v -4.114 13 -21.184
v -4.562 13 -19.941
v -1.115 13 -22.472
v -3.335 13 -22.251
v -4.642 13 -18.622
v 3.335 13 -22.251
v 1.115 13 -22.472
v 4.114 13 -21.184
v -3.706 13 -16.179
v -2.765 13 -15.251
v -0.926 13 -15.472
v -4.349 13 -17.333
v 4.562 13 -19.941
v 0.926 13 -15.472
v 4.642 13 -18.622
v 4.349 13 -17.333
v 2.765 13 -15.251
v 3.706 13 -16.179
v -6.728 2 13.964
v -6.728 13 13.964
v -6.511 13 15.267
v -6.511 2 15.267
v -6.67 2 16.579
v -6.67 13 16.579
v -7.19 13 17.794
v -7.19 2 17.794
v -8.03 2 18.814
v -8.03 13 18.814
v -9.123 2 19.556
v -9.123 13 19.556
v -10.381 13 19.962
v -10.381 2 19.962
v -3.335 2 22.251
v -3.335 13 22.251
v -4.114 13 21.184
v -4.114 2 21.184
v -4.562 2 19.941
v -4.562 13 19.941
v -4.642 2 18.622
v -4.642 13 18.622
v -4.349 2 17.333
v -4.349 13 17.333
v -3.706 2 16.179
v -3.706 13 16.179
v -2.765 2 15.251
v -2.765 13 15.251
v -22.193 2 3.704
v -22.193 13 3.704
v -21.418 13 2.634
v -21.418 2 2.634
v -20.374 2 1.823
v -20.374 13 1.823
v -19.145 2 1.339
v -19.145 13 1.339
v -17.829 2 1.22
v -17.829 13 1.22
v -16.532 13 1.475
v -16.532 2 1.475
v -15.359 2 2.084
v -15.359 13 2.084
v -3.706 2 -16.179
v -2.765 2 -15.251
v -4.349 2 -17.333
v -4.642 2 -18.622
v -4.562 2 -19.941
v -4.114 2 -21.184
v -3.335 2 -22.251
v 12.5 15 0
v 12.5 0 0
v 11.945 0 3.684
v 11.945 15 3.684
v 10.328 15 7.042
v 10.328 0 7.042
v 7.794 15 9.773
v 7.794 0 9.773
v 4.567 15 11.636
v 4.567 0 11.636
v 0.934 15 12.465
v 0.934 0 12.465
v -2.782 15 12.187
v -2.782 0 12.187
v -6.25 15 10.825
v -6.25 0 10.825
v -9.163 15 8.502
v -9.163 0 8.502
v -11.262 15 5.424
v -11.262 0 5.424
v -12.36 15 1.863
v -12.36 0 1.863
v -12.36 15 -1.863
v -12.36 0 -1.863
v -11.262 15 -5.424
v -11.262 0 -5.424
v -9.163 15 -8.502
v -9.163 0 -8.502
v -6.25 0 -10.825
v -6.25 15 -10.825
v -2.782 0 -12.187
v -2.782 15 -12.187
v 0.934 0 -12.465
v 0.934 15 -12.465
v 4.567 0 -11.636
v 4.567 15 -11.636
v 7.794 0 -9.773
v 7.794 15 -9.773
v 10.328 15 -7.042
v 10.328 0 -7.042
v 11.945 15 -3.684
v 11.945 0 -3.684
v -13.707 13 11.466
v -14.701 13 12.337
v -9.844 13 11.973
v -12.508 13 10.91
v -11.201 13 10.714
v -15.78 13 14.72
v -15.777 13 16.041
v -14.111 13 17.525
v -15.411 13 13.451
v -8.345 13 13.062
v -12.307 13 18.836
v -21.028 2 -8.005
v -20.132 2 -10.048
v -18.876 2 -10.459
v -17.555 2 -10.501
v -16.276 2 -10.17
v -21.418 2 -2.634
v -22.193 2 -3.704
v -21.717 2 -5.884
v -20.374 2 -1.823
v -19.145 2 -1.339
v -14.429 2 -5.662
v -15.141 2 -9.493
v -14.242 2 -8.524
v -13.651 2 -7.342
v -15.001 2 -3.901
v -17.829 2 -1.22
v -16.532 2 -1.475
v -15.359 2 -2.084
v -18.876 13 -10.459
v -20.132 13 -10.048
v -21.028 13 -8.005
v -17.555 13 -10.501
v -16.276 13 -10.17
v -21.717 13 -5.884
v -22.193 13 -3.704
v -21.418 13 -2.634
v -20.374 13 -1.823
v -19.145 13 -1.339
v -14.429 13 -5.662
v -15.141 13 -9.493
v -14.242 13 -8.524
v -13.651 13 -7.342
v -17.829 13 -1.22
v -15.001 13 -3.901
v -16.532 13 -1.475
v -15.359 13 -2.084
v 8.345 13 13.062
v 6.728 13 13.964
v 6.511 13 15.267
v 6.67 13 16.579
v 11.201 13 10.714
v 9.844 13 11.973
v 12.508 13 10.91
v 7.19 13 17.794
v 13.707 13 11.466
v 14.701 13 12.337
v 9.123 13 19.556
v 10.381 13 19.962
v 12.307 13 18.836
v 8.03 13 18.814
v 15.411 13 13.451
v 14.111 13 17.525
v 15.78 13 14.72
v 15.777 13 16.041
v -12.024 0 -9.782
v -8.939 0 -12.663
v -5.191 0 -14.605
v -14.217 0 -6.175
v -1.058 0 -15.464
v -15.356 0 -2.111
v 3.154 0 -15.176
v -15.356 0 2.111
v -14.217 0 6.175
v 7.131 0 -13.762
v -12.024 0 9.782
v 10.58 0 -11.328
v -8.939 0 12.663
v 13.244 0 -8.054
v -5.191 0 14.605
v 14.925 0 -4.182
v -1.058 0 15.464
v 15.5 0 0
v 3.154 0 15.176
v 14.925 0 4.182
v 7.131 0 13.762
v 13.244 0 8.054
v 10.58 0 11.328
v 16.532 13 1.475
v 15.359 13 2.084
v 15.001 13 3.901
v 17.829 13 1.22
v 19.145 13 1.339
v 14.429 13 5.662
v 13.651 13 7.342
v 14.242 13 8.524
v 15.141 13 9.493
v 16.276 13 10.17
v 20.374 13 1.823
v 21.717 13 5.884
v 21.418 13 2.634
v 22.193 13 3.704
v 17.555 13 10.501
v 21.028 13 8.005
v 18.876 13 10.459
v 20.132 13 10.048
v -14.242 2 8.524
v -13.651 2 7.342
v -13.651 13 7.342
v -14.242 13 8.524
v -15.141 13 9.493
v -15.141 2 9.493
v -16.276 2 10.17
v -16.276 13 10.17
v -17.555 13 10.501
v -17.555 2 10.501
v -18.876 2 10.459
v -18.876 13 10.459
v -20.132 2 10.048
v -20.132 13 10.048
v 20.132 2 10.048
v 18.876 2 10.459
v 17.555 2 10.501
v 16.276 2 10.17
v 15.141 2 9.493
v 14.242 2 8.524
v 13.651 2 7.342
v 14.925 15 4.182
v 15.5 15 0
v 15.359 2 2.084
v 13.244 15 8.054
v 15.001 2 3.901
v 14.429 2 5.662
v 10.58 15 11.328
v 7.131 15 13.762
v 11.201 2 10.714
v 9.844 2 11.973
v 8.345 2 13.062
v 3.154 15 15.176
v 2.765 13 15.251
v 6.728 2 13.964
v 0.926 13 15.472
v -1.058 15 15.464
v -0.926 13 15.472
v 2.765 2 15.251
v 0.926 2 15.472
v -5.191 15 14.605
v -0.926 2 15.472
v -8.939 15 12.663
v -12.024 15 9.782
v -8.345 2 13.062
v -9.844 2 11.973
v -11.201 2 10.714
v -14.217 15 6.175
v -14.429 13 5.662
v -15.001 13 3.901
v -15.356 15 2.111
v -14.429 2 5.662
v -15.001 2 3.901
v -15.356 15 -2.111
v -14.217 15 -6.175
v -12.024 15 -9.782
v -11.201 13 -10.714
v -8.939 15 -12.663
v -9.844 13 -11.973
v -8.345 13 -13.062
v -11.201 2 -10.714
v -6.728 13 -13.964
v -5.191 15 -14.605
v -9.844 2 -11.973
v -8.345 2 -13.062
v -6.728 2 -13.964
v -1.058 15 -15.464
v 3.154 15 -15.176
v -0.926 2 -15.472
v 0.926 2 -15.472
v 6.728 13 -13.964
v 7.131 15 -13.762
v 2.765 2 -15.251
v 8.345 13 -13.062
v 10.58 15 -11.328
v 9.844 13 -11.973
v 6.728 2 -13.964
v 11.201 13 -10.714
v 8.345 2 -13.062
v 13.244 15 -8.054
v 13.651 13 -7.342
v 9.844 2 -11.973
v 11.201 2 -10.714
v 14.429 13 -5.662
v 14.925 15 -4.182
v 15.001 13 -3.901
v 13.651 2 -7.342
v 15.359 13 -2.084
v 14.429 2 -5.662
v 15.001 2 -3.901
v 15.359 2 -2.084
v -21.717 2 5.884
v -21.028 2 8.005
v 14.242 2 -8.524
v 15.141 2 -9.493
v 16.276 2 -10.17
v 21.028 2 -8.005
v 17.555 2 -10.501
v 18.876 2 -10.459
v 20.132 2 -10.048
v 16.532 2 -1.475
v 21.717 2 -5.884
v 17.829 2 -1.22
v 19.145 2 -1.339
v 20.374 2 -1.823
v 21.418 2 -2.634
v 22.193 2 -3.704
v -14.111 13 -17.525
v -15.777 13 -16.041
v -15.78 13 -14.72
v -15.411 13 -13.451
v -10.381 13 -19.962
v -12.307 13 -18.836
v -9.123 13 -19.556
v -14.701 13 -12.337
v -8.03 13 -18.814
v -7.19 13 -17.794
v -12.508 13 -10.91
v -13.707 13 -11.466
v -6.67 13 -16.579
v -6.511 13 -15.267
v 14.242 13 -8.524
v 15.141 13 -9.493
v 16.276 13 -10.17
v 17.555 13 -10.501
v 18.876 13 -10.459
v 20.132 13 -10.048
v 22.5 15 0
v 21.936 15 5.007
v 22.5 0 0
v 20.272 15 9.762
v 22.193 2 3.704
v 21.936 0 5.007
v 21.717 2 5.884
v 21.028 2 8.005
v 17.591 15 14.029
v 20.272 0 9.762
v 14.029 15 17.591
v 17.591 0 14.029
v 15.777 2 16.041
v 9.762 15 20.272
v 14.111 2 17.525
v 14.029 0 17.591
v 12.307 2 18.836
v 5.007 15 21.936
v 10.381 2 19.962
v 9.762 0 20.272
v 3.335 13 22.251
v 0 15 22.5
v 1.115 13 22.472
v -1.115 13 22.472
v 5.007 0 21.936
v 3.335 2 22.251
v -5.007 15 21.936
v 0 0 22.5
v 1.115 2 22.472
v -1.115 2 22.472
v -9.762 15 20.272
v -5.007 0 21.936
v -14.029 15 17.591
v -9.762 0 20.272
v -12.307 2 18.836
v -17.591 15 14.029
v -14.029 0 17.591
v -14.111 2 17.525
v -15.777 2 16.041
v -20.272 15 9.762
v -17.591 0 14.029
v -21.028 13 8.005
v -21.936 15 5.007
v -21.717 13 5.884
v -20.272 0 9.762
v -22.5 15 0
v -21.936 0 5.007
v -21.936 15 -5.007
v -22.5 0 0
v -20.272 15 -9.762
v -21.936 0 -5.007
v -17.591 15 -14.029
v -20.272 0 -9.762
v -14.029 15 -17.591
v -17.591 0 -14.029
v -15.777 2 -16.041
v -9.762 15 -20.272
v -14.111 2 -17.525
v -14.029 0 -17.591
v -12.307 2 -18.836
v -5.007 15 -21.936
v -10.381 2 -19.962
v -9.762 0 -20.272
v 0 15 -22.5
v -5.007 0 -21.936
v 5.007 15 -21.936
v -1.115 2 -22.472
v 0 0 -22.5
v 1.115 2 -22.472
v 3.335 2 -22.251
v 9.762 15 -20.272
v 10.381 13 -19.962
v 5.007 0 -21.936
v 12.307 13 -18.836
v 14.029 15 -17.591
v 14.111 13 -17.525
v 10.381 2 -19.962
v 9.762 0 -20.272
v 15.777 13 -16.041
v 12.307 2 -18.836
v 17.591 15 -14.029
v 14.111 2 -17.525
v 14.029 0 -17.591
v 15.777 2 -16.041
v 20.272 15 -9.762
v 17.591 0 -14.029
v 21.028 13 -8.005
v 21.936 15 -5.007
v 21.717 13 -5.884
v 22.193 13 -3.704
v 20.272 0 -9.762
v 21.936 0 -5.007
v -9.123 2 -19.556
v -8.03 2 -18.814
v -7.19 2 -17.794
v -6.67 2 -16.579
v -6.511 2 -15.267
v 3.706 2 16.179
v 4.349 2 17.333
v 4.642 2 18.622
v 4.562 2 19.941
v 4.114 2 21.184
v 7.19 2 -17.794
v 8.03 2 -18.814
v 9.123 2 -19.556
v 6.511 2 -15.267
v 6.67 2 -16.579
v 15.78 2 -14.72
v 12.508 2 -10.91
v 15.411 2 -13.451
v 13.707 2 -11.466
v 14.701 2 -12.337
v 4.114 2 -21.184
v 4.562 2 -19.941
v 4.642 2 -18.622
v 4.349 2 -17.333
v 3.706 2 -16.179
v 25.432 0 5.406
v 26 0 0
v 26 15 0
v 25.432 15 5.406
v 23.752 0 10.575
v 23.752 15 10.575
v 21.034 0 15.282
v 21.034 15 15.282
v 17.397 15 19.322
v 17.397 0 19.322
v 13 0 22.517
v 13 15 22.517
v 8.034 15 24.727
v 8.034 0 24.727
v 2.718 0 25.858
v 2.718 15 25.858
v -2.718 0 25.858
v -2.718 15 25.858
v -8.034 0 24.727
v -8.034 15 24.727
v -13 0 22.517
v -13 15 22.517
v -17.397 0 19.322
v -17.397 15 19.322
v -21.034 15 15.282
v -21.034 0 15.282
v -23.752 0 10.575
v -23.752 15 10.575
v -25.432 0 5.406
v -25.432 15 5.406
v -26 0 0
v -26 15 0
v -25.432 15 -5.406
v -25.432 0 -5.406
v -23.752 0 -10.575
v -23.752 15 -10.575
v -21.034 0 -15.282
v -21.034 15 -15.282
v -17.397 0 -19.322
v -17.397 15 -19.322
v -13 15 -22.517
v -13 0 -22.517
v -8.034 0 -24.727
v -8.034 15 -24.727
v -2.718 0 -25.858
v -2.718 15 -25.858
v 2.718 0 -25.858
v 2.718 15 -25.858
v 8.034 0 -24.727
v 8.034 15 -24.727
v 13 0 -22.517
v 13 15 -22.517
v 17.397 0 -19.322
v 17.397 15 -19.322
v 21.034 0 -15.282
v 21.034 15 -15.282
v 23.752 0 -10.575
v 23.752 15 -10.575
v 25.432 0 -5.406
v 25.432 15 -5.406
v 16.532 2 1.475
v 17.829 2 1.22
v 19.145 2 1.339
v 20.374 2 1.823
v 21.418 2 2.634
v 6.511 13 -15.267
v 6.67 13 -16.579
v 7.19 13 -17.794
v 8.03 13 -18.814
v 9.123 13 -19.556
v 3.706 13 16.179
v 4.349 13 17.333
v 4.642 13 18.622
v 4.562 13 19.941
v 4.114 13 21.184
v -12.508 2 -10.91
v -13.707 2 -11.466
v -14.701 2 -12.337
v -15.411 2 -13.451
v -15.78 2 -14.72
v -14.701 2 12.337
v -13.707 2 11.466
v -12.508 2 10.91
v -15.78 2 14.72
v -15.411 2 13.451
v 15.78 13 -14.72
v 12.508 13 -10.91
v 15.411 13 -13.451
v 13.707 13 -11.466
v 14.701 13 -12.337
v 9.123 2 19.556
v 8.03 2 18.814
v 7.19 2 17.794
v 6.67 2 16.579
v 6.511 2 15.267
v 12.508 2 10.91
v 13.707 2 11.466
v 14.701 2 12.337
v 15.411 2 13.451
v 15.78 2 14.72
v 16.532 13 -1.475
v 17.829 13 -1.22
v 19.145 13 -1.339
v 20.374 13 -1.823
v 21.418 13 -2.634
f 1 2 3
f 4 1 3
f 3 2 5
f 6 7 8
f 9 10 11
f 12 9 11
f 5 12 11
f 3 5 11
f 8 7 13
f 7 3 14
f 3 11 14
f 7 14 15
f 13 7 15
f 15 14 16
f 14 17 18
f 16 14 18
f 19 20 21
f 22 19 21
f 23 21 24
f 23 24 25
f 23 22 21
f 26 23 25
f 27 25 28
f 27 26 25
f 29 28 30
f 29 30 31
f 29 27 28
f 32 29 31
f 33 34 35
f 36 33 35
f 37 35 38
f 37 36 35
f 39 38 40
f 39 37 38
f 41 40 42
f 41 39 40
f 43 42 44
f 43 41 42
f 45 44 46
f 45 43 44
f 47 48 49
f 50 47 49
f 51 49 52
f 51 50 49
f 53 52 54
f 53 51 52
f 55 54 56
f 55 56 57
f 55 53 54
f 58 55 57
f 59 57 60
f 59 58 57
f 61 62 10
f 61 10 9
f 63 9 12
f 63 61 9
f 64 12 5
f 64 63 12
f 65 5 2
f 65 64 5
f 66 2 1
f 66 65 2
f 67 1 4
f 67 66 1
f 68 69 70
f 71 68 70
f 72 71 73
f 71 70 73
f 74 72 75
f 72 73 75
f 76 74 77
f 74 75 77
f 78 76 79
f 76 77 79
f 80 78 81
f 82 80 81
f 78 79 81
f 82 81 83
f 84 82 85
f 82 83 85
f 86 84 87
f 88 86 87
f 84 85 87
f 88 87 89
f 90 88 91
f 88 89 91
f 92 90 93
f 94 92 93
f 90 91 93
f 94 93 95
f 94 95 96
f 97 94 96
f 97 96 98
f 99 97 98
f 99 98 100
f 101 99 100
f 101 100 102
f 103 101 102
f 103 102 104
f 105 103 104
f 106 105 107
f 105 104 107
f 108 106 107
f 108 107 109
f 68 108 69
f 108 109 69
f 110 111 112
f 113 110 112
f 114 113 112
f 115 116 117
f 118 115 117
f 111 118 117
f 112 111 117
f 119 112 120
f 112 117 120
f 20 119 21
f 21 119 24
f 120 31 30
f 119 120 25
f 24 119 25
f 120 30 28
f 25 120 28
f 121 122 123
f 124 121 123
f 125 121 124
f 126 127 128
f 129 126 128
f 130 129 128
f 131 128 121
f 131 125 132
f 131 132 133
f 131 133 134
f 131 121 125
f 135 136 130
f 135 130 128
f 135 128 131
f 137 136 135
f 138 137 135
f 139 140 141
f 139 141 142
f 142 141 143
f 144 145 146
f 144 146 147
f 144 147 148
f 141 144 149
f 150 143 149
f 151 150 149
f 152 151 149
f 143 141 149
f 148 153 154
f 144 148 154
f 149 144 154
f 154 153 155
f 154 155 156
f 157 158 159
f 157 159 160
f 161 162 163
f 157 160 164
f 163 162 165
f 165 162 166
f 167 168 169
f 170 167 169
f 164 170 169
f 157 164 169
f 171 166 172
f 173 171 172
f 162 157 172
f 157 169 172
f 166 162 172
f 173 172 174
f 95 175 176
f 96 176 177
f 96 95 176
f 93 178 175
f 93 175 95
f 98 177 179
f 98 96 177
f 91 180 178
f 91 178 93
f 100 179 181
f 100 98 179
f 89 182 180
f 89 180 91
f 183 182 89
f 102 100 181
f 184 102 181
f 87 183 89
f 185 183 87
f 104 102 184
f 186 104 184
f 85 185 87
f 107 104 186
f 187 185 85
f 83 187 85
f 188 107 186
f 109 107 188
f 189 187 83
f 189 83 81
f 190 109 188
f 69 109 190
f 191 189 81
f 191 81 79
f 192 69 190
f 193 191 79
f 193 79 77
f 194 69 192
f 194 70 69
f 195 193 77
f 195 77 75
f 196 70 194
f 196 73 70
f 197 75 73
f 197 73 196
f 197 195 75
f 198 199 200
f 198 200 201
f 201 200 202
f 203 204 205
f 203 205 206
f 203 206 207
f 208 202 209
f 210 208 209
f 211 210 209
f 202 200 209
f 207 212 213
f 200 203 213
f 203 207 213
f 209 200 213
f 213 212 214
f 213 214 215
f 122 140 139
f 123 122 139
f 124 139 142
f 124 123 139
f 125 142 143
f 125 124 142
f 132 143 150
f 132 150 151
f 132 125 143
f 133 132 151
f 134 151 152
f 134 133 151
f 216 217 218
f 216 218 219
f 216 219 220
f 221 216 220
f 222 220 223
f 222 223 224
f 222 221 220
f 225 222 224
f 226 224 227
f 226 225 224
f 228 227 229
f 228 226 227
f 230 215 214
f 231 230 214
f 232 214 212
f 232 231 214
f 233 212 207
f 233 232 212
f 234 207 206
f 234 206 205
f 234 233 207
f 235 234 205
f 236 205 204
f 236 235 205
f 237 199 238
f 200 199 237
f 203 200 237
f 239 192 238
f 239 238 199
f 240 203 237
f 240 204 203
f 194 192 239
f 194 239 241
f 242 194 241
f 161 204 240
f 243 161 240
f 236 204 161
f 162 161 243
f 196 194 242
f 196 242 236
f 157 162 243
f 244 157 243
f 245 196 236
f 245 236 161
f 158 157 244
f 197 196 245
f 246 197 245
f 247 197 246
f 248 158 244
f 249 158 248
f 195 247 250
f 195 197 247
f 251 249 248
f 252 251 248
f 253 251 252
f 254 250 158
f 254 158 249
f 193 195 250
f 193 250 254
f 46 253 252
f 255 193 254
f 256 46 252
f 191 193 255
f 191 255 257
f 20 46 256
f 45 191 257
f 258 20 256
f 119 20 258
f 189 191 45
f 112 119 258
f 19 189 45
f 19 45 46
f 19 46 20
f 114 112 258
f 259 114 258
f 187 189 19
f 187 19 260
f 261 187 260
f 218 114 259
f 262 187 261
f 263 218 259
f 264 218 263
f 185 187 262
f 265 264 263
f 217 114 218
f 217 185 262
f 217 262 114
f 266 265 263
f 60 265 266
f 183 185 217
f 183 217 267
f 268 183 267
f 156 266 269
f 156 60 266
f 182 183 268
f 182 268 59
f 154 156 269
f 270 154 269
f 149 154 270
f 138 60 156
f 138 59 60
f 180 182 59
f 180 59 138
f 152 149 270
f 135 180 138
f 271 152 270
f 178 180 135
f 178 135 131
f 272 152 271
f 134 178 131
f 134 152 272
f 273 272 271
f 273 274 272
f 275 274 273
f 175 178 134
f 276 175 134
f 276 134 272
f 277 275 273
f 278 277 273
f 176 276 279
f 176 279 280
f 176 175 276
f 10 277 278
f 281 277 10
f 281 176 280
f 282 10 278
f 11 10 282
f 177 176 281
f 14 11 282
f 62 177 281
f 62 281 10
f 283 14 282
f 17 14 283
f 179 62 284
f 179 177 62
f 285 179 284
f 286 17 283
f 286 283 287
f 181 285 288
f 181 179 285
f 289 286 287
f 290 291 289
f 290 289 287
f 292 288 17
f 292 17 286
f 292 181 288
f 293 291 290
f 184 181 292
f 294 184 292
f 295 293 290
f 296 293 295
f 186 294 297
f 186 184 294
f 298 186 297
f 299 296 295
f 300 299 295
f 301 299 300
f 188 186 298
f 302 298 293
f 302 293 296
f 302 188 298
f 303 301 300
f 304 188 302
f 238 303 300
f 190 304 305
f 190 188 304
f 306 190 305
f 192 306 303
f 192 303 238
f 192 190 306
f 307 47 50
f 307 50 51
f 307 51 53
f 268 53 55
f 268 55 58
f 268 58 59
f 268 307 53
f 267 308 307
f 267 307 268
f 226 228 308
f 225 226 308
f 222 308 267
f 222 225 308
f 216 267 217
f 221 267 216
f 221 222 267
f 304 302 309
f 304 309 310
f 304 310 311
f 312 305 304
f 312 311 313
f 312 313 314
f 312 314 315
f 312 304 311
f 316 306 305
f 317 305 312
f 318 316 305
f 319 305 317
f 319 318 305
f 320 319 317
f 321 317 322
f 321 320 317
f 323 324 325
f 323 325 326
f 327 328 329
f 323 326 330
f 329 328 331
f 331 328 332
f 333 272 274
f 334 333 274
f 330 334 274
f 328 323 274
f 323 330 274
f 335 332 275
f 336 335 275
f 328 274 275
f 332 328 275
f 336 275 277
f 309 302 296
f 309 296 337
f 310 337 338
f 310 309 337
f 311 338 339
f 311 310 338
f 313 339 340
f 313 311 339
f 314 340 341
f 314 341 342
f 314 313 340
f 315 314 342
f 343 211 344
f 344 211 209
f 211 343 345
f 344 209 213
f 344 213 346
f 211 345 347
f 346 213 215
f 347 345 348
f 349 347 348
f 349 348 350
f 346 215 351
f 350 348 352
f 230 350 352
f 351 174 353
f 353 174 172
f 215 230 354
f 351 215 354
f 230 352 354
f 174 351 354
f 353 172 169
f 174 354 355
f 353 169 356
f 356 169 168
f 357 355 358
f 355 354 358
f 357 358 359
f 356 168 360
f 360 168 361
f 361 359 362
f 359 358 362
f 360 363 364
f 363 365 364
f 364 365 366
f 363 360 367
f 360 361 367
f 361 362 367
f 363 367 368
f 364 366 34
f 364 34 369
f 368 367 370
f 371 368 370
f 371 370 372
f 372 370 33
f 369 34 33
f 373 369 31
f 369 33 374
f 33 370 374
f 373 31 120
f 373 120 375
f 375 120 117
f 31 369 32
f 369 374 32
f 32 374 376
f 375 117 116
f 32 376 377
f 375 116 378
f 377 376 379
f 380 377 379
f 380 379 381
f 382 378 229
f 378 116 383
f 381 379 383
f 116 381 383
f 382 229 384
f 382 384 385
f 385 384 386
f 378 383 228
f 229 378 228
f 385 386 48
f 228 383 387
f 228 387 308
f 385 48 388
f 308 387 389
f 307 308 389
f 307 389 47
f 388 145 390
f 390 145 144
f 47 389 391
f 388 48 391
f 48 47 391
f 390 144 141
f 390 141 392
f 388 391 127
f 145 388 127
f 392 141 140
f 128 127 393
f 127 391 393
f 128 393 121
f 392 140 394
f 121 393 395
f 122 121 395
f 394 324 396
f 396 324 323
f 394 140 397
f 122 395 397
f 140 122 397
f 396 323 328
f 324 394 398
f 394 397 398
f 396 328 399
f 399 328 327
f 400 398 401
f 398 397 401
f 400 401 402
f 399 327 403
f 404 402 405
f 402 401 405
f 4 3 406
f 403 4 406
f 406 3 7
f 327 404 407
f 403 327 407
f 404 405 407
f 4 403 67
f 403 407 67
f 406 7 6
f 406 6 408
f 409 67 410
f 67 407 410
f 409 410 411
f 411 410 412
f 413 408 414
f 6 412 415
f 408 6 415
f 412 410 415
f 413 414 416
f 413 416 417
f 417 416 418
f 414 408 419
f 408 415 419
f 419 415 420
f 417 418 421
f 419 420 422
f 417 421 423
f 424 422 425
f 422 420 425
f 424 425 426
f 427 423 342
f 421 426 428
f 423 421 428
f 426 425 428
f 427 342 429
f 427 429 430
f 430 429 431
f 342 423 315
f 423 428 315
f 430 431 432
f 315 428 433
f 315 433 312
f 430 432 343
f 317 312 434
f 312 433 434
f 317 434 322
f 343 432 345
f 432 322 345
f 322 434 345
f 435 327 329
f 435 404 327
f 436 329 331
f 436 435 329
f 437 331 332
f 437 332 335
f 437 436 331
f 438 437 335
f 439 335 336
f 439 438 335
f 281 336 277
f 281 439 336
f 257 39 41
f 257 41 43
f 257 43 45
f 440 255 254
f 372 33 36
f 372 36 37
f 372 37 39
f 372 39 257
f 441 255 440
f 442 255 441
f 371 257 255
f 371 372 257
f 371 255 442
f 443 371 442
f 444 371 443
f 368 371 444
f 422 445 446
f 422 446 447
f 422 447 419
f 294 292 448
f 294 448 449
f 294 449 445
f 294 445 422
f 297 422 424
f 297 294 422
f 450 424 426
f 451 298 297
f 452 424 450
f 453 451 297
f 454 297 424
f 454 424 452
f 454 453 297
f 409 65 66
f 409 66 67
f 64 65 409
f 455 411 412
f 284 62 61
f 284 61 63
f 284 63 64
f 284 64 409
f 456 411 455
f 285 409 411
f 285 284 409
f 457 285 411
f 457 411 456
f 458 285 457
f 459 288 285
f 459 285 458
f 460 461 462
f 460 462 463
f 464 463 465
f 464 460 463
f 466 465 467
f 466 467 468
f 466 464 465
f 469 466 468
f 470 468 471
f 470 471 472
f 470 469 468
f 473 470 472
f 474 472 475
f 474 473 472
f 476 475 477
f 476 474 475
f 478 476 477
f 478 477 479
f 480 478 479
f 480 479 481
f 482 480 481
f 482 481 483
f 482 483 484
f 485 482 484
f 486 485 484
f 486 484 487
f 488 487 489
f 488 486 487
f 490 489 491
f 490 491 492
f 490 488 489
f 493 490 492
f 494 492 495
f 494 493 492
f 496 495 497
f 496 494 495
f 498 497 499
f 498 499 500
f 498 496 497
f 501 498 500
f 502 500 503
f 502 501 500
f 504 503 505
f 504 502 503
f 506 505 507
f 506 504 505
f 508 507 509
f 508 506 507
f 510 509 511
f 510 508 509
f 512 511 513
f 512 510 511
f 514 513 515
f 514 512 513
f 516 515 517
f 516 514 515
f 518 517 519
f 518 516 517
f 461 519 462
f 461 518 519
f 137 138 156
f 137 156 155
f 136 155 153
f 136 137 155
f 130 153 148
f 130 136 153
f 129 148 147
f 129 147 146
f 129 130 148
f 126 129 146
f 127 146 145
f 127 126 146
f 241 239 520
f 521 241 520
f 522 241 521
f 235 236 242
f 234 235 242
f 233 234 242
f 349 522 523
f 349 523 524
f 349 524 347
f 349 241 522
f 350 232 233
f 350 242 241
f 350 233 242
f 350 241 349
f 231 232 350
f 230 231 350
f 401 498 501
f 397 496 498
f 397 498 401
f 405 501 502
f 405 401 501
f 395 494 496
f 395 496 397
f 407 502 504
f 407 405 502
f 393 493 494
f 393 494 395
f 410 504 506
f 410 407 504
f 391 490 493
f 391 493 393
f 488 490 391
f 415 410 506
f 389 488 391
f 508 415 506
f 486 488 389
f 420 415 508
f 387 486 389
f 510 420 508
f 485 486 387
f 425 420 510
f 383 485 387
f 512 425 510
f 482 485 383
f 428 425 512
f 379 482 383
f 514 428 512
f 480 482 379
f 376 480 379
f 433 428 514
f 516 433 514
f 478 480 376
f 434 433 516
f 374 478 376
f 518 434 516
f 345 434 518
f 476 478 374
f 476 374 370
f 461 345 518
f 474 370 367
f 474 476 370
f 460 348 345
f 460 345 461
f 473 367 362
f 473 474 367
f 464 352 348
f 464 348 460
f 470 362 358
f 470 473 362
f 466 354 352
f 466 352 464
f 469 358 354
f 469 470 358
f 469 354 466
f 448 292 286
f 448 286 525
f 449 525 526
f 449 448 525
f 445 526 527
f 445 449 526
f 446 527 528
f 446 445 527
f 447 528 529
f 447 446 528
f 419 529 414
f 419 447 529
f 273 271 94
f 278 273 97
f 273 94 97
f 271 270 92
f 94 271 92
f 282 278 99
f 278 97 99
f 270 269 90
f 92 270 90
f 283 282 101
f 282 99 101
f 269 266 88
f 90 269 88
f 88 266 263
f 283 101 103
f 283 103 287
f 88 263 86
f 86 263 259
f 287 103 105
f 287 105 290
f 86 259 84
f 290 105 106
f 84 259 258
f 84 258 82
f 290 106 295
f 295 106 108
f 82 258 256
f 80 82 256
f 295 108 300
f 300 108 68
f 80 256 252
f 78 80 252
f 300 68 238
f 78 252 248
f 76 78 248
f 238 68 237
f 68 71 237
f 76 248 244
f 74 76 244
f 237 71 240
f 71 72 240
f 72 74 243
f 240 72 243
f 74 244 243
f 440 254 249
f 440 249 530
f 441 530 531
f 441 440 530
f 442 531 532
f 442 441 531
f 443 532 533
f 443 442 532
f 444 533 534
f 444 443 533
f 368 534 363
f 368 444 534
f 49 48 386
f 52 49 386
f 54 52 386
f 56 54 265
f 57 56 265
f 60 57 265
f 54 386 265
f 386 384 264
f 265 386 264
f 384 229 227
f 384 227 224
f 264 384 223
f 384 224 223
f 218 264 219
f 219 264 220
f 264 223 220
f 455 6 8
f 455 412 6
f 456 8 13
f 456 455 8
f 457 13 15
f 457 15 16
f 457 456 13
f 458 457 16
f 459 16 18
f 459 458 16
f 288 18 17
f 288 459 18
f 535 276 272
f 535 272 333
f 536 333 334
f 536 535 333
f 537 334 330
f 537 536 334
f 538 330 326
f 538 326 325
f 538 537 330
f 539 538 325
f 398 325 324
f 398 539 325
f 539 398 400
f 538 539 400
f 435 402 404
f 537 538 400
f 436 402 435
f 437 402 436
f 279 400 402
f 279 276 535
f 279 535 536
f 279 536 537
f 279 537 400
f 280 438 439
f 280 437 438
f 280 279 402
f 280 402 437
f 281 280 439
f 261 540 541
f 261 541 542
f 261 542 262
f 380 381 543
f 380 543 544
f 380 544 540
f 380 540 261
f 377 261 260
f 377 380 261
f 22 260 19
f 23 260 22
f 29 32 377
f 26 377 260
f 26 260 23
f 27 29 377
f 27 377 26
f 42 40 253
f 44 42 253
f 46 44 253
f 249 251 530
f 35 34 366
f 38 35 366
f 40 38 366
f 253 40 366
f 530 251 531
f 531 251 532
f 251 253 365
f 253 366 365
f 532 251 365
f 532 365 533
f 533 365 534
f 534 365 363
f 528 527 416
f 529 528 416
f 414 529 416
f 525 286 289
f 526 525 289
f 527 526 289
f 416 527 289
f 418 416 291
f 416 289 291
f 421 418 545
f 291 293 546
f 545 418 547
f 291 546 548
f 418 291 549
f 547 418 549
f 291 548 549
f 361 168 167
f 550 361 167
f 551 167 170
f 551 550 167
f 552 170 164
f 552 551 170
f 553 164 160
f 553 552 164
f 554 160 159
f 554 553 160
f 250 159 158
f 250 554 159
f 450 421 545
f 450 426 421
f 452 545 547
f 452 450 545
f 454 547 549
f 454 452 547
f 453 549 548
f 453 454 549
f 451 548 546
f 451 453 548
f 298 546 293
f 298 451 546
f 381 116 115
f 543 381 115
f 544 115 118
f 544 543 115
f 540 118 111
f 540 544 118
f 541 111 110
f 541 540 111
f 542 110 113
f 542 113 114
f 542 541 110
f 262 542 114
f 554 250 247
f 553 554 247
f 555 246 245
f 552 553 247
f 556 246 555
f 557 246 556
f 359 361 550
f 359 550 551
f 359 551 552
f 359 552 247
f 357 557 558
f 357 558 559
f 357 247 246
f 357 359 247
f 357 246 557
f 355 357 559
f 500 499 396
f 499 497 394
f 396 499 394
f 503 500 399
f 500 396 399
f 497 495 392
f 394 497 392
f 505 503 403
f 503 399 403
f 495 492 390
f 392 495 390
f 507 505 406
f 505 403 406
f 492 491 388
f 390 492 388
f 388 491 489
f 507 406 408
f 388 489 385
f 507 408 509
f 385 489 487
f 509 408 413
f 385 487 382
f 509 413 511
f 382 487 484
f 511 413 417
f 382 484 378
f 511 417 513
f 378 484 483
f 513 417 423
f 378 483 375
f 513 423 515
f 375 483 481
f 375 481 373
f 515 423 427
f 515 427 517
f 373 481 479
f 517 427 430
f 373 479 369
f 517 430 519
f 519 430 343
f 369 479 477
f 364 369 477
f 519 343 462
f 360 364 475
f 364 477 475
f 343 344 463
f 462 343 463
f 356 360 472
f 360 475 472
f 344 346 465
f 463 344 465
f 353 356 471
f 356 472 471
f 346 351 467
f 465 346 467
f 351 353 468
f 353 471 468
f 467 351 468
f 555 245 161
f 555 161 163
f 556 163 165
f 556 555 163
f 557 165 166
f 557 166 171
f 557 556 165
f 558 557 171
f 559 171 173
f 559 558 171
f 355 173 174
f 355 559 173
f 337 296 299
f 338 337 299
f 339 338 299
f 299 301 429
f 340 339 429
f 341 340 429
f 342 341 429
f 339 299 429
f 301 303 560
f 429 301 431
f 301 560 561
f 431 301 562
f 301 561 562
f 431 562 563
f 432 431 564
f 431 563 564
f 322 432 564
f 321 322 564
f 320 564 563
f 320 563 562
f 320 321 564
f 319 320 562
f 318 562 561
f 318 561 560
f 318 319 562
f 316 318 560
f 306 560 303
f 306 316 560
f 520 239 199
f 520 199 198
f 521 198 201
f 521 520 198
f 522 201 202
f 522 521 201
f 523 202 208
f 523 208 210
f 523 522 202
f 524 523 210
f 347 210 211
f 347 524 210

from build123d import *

# Parameters (mm, degrees)
F0_R     = 15.5
F0_R_2   = 12.5
F1_DEPTH = 15
F0_R_3   = 26
F0_R_4   = 22.5
F3_R     = 4.6577592735
F4_DEPTH = 11


with BuildPart() as f1:
    # F0 (on Front) → F1 (new body)
    with BuildSketch(Plane.XZ):
        Circle(F0_R)
        Circle(F0_R_2, mode=Mode.SUBTRACT)
    extrude(amount=-F1_DEPTH)



with BuildPart() as f1b:
    # F0 (on Front) → F1, piece 2 (new body)
    with BuildSketch(Plane.XZ):
        Circle(F0_R_3)
        Circle(F0_R_4, mode=Mode.SUBTRACT)
    extrude(amount=-F1_DEPTH)


with BuildPart() as f1_1:
    add(f1.part)

    add(f1b.part)  # F4 merges F1b
    # F3 (on offset) → F4 (join)
    with BuildSketch(Plane.XZ.offset(-2)):
        with Locations((0, 19)):
            Circle(F3_R)
        with Locations((-11.1679197936, 15.3713228931)):
            Circle(F3_R)
        with Locations((-18.0700738096, 5.8713228931)):
            Circle(F3_R)
        with Locations((-18.0700738096, -5.8713228931)):
            Circle(F3_R)
        with Locations((-11.1679197936, -15.3713228931)):
            Circle(F3_R)
        with Locations((0, -19)):
            Circle(F3_R)
        with Locations((11.1679197936, -15.3713228931)):
            Circle(F3_R)
        with Locations((18.0700738096, -5.8713228931)):
            Circle(F3_R)
        with Locations((18.0700738096, 5.8713228931)):
            Circle(F3_R)
        with Locations((11.1679197936, 15.3713228931)):
            Circle(F3_R)
    extrude(amount=-F4_DEPTH)


solid = f1_1.part
